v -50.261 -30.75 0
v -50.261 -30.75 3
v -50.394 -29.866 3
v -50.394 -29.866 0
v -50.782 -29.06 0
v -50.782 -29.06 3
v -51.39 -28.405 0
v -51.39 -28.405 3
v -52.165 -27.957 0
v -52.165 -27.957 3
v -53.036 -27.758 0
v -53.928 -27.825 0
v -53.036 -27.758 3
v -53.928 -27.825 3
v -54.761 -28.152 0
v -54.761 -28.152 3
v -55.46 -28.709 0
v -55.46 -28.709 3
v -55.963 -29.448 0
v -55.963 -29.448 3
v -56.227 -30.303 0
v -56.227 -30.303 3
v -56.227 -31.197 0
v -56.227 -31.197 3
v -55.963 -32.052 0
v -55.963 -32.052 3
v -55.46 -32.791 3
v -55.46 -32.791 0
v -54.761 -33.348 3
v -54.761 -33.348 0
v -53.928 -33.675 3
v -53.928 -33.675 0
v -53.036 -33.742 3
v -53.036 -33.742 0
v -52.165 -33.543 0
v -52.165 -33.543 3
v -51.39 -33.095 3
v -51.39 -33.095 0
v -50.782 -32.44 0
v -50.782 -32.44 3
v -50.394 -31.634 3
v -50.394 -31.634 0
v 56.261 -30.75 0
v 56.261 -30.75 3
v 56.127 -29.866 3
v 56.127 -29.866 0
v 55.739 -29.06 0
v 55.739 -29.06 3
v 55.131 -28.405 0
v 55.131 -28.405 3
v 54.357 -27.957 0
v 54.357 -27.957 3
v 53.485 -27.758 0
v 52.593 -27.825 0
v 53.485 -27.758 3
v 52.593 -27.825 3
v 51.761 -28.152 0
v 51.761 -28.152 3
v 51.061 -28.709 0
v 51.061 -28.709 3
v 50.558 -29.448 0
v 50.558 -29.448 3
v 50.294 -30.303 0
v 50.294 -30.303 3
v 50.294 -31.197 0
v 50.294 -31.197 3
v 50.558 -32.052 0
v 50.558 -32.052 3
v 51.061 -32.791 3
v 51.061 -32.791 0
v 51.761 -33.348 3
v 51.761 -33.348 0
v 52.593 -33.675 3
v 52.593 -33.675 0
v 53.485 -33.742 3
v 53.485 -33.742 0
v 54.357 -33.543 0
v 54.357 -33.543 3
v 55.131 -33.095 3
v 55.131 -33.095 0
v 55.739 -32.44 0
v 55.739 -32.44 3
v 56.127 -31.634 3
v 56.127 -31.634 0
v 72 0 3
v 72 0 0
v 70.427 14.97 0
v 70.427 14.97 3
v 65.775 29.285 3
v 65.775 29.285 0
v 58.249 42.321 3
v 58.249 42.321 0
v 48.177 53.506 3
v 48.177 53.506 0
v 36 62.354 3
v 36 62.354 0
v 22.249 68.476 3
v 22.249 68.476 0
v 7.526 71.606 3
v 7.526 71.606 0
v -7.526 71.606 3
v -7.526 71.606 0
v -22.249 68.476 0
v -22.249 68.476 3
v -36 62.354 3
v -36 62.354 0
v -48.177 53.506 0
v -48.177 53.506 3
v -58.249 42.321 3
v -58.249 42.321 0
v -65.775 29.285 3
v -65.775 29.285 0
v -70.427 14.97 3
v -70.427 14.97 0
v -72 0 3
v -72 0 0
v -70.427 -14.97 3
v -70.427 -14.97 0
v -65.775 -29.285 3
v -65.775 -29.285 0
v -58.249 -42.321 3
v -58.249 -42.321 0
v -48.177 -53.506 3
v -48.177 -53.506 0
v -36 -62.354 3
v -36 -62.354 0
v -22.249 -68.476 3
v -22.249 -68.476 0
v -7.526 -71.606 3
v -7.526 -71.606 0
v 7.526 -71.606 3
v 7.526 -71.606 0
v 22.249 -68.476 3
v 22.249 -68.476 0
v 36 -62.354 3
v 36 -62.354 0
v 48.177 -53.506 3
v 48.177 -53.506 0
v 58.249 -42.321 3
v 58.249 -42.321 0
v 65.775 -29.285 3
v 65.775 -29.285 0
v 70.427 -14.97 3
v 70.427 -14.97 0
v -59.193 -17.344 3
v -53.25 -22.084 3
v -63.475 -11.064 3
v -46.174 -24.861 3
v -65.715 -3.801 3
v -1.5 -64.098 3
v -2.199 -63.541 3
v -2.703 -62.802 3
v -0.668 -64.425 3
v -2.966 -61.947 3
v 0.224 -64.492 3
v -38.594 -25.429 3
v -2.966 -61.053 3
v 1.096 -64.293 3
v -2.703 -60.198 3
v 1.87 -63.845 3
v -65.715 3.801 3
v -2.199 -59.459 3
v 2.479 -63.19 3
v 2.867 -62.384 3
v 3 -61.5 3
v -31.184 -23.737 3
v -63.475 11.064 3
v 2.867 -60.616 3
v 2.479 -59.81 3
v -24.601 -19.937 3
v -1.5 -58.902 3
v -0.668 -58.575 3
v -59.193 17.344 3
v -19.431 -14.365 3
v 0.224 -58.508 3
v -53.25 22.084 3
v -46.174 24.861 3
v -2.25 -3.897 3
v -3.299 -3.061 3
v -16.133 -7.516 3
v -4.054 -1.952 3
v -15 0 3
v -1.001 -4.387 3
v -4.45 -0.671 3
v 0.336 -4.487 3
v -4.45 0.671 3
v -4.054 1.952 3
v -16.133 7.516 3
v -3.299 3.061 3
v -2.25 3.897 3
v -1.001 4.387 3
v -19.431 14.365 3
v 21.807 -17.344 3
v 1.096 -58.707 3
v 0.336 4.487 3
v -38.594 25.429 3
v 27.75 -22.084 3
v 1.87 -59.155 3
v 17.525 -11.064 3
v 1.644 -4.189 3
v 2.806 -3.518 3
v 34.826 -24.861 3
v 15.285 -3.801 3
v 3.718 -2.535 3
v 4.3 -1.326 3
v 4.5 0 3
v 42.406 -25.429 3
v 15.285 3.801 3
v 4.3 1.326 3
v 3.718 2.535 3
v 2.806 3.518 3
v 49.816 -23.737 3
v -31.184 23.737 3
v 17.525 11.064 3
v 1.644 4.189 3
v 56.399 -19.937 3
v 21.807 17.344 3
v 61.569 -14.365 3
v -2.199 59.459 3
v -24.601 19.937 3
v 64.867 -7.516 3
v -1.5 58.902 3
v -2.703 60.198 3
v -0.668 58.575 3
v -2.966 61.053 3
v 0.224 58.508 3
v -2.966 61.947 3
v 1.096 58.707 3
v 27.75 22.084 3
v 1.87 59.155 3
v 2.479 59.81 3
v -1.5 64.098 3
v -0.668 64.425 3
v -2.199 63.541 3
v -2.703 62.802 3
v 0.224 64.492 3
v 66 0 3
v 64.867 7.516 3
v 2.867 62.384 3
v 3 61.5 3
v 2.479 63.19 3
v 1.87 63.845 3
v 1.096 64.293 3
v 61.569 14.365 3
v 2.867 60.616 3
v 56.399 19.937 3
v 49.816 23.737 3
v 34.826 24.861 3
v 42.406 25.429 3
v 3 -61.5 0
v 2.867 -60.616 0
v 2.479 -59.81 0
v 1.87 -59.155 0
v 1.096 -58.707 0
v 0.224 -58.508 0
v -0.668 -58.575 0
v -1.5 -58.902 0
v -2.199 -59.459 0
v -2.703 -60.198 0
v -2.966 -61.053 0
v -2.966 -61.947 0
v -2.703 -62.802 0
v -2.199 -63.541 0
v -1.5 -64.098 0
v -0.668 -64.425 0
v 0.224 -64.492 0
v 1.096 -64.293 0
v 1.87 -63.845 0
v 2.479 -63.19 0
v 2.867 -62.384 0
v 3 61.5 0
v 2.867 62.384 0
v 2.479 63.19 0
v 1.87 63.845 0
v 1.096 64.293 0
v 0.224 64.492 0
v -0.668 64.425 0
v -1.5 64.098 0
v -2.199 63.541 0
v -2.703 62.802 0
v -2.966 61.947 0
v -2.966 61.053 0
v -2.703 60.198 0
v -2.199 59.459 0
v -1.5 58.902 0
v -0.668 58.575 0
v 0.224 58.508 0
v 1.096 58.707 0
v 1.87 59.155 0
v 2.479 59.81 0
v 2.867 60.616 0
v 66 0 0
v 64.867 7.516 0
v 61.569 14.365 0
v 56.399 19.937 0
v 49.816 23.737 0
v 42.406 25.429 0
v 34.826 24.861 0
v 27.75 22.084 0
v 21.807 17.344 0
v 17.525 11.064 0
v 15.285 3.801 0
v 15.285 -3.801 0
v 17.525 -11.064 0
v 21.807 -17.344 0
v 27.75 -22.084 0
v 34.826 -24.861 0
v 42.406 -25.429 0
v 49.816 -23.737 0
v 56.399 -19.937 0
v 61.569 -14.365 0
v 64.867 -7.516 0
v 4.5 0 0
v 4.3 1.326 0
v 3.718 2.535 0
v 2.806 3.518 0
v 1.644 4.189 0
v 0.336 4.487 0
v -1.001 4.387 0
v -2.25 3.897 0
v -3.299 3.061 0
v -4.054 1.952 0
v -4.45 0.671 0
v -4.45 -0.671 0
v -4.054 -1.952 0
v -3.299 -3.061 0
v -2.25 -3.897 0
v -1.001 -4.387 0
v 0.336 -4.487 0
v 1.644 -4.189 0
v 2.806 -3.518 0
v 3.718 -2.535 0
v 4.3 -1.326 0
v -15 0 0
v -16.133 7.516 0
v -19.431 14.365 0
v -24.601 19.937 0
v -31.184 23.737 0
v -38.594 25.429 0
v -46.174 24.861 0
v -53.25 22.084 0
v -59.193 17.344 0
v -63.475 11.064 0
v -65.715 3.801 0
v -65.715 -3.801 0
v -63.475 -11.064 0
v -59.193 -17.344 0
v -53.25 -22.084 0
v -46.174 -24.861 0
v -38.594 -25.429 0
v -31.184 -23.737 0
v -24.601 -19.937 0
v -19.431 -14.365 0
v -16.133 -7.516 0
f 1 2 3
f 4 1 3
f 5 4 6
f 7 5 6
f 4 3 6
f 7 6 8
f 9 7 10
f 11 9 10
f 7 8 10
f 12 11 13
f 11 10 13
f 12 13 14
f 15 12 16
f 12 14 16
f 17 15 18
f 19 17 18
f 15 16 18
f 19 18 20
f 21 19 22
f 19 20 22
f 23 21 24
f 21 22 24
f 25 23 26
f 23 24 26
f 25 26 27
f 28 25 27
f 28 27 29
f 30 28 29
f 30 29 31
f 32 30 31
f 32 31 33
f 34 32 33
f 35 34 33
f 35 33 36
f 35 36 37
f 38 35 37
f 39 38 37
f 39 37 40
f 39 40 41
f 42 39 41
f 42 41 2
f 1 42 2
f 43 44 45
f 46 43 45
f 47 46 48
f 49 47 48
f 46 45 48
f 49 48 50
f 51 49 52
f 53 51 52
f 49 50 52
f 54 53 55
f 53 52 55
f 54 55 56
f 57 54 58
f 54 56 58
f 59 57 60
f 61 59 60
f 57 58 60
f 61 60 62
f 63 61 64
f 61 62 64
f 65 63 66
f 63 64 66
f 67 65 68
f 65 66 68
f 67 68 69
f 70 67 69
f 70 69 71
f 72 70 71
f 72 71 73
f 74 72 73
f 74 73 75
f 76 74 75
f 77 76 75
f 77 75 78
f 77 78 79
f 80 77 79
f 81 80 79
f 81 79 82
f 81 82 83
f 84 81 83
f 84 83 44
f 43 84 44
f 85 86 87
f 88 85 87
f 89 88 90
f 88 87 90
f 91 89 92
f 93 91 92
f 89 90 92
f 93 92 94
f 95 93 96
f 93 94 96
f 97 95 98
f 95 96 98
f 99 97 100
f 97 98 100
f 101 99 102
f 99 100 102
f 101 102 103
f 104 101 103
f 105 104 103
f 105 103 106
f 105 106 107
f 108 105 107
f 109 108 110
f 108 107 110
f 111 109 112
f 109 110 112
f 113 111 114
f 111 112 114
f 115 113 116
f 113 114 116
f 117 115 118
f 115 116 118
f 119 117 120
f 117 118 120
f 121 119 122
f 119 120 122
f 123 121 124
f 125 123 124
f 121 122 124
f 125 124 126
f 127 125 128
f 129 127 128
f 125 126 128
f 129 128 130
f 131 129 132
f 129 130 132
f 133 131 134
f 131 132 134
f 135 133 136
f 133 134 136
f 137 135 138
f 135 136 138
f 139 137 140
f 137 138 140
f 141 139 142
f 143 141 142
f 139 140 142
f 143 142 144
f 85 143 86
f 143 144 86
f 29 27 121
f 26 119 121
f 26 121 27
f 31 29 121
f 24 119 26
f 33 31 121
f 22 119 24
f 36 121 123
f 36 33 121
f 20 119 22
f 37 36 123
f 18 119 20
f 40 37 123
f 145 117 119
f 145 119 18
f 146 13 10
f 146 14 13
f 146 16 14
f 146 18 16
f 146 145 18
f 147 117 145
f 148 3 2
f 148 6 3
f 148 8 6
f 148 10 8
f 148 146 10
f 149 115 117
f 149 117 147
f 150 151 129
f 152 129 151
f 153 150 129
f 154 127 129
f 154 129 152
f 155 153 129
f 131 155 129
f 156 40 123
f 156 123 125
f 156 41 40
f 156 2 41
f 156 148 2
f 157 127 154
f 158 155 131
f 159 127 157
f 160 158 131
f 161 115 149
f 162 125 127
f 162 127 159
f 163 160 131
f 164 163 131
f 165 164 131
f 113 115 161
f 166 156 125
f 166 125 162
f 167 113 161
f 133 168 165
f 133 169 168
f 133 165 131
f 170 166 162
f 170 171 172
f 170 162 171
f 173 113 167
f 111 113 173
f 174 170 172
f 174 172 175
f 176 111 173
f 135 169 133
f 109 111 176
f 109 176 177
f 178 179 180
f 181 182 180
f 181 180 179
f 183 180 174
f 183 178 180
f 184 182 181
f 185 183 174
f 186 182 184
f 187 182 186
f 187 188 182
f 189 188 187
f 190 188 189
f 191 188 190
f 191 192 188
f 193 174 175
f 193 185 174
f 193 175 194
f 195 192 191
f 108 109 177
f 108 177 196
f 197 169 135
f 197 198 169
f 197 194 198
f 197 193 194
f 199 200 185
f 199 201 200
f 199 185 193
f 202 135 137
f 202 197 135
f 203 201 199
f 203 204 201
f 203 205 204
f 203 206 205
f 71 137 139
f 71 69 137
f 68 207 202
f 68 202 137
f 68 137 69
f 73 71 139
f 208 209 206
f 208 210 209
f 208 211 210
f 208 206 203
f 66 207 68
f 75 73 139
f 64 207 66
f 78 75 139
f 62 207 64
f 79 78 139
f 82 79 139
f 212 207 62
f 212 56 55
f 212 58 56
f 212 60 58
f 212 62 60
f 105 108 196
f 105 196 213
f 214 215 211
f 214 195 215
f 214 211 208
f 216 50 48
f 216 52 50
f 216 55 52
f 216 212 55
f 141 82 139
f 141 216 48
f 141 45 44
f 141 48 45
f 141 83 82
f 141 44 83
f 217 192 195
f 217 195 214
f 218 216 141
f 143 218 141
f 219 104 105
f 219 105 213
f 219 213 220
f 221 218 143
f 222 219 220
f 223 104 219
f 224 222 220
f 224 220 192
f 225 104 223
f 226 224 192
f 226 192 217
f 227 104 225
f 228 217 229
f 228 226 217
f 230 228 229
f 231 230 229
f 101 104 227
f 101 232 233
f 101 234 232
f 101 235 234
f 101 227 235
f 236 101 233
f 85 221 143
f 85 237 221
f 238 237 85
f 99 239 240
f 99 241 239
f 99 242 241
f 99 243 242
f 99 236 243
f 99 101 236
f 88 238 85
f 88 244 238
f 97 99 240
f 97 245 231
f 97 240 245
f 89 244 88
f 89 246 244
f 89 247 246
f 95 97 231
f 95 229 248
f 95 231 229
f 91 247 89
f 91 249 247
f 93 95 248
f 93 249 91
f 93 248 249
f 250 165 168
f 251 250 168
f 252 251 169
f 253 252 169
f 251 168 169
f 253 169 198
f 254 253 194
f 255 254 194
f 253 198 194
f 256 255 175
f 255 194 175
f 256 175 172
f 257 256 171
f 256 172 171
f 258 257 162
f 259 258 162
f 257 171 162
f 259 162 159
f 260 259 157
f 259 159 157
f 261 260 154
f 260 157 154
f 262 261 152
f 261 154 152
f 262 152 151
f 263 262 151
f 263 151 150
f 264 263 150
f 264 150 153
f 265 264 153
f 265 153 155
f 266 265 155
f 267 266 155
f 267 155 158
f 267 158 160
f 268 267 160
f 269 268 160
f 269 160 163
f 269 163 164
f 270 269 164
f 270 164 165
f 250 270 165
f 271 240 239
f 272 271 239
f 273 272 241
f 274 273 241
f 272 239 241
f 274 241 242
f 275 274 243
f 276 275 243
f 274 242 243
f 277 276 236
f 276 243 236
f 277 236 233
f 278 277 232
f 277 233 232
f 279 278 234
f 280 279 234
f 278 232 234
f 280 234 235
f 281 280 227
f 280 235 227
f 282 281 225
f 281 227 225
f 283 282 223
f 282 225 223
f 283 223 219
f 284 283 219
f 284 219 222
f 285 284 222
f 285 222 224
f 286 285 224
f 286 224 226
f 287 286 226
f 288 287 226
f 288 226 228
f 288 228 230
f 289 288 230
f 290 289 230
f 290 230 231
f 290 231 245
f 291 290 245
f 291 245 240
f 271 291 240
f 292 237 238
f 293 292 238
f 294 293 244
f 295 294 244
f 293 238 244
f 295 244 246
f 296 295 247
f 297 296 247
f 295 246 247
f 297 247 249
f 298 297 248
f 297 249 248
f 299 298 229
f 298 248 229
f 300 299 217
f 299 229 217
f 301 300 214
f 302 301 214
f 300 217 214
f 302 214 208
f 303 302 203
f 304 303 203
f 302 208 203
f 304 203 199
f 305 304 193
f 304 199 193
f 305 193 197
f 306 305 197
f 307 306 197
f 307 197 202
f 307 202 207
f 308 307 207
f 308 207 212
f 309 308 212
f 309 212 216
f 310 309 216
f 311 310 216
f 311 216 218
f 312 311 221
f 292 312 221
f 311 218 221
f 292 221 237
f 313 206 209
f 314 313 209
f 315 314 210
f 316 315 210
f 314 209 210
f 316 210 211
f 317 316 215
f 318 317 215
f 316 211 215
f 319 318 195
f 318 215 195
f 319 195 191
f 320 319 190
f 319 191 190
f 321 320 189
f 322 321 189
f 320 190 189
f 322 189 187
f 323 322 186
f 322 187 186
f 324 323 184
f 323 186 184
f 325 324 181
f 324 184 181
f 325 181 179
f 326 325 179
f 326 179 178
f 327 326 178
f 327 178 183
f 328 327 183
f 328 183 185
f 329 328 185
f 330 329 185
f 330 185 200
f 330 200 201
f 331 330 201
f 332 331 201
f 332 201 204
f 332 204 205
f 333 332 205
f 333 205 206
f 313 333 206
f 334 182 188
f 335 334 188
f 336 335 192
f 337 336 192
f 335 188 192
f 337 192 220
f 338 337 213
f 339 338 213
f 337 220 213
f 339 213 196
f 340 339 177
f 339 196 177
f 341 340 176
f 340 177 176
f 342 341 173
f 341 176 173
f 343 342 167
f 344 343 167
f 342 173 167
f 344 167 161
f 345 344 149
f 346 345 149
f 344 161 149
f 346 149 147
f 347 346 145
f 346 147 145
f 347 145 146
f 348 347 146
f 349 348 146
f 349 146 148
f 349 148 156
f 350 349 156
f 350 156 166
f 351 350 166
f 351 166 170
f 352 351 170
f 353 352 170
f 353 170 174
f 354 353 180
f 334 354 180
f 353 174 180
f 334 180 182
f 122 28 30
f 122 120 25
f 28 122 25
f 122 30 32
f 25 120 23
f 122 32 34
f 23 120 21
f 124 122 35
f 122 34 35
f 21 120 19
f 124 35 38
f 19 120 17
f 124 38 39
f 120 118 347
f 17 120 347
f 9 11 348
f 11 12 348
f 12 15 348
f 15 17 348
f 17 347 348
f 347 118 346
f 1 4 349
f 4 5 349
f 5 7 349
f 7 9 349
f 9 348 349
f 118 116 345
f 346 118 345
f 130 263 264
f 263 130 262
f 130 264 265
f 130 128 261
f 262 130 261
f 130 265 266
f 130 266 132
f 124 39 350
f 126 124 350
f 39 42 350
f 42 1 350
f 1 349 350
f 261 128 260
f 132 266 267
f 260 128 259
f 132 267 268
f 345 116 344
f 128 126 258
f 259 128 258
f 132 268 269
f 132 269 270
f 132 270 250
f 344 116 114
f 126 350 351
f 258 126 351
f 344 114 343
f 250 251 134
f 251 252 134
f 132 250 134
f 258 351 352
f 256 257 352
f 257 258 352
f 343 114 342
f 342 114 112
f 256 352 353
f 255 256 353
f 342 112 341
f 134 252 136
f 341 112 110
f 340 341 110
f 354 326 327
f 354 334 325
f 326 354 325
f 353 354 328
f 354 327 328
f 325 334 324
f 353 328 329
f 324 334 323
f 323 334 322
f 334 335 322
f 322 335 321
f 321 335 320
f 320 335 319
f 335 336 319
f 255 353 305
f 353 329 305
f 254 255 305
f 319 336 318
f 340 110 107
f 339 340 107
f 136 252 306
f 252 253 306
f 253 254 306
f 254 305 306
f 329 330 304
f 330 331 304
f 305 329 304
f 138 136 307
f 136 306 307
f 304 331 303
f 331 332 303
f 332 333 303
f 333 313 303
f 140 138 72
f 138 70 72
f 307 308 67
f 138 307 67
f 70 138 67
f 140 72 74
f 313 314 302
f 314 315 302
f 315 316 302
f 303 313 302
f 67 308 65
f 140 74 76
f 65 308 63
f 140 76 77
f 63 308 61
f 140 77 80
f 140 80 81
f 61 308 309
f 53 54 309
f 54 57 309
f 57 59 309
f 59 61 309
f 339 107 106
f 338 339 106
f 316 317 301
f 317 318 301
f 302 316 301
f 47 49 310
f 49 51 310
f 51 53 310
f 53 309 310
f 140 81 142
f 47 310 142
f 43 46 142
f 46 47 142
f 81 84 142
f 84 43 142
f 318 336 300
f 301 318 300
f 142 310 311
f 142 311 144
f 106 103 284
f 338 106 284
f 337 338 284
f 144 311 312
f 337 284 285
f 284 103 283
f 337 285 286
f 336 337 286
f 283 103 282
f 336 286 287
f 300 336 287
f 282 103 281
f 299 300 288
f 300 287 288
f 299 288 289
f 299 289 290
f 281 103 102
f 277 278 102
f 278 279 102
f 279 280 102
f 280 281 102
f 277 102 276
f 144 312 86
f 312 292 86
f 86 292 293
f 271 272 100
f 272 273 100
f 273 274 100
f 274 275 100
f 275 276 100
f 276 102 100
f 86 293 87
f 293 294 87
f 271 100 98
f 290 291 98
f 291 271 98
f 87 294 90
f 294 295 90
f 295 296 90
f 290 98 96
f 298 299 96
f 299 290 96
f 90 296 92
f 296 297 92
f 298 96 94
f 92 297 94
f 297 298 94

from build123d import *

# Parameters (mm, degrees)
F0_R     = 72
F1_DEPTH = 3
F2_R     = 25.5
F3_DEPTH = 3
F4_R     = 3
F4_R_2   = 4.5
F5_DEPTH = 25.4
F6_R     = 3
F7_DEPTH = 25.4


with BuildPart() as f1:
    # F0 (on Top) → F1 (new body)
    with BuildSketch(Plane.XY):
        Circle(F0_R)
    extrude(amount=F1_DEPTH)

    # F2 (on face) → F3 (cut)
    with BuildSketch(Plane.XY.offset(3)):
        with Locations((-40.5, 0)):
            Circle(F2_R)
        with Locations((40.5, 0)):
            Circle(F2_R)
    extrude(amount=-F3_DEPTH, mode=Mode.SUBTRACT)

    # F4 (on face) → F5 (cut)
    with BuildSketch(Plane.XY.offset(3)):
        with Locations((0, 61.5)):
            Circle(F4_R)
        Circle(F4_R_2)
        with Locations((0, -61.5)):
            Circle(F4_R)
    extrude(amount=-F5_DEPTH, mode=Mode.SUBTRACT)

    # F6 (on face) → F7 (cut)
    with BuildSketch(Plane.XY.offset(3)):
        with Locations((-53.260562, -30.75)):
            Circle(F6_R)
        with Locations((53.260562, -30.75)):
            Circle(F6_R)
    extrude(amount=-F7_DEPTH, mode=Mode.SUBTRACT)


solid = f1.part
